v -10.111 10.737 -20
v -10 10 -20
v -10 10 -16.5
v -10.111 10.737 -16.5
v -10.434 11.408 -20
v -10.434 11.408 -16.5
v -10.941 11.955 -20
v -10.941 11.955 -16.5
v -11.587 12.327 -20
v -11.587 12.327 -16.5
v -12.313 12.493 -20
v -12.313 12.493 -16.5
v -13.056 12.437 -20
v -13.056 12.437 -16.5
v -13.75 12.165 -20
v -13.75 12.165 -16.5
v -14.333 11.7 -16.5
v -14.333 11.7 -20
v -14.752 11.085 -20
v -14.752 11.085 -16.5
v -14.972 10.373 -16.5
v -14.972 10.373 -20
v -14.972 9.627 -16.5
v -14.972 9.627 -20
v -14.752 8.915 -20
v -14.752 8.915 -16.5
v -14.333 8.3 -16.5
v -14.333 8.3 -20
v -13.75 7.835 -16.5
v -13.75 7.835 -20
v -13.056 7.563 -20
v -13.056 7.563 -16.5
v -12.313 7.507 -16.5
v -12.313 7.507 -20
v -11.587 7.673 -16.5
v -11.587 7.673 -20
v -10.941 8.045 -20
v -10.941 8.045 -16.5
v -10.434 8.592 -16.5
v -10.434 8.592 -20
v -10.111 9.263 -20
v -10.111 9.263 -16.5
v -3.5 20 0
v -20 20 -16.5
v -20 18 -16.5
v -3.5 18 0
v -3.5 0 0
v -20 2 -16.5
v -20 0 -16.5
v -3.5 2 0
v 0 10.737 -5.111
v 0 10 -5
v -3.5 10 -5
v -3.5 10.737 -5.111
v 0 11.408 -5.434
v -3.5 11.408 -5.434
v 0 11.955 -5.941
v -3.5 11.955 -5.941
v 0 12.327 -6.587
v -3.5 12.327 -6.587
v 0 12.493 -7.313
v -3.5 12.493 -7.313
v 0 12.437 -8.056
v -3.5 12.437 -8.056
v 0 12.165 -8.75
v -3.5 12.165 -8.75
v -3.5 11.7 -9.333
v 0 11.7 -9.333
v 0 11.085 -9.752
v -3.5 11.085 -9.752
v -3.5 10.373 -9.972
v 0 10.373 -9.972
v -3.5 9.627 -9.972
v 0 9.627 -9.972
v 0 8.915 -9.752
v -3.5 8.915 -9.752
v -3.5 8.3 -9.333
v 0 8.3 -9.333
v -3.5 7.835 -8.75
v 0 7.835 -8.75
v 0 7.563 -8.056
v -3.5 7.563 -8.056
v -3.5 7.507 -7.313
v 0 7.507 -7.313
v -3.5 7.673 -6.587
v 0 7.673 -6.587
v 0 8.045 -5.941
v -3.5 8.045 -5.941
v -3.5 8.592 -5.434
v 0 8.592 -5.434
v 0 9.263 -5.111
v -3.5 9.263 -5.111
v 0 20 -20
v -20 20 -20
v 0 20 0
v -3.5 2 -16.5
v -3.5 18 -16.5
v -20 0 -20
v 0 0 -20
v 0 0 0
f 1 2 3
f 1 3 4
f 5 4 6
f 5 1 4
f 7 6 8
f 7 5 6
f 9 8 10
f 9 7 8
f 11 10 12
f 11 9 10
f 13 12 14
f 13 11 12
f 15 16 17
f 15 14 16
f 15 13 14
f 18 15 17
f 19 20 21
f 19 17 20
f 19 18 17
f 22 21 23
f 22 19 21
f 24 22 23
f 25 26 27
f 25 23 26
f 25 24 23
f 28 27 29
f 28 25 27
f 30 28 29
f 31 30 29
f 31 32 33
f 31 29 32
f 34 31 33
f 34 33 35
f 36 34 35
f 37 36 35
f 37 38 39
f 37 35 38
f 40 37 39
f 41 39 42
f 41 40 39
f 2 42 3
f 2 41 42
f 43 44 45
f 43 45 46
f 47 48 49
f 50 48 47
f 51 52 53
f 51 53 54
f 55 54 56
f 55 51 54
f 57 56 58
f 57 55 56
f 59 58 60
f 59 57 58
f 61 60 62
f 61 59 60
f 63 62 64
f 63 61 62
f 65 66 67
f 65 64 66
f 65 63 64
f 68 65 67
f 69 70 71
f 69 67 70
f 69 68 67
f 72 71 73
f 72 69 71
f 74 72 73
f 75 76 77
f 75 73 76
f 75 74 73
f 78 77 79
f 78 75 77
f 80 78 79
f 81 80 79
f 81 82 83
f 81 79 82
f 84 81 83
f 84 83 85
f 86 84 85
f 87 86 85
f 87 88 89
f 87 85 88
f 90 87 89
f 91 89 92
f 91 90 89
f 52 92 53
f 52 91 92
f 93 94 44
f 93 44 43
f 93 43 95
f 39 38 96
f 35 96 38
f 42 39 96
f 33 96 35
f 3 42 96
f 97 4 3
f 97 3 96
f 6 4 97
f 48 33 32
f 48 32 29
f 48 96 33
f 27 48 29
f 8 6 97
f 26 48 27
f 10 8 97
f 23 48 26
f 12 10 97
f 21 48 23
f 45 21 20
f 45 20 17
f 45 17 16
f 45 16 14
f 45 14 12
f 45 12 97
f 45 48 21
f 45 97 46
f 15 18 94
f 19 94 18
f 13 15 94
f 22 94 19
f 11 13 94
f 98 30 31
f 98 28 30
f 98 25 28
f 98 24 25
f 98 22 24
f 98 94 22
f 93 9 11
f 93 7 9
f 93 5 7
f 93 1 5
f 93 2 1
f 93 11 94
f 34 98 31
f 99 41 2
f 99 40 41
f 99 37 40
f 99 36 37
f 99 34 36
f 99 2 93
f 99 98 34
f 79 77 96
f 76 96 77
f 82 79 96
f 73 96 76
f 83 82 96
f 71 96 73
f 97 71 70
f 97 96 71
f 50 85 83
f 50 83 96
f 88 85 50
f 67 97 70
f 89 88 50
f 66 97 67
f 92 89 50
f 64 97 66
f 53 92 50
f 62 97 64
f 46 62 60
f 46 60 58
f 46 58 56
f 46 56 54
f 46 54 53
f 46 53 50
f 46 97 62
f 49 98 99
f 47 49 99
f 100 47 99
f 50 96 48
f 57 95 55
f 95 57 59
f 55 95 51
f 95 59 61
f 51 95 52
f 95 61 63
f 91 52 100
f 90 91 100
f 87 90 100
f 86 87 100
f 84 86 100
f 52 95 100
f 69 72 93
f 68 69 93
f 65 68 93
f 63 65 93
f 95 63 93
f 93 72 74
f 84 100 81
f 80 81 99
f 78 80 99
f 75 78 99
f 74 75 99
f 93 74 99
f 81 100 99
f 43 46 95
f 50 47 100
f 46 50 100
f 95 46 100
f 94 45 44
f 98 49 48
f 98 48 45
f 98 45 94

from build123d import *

# Parameters (mm, degrees)
SKETCH1_W               = 20
SKETCH1_H               = 20
BOSS_EXTRUDE1_DEPTH     = 20
SKETCH2_W               = 16.5
SKETCH2_H               = 16
CUT_EXTRUDE1_DEPTH      = 16.5
CUT_EXTRUDE2_DEPTH      = 34.526109228
CUT_EXTRUDE2_DEPTH_BACK = 34.526109228
CUT_EXTRUDE3_DEPTH      = 33.74522866
CUT_EXTRUDE3_DEPTH_BACK = 33.74522866
SKETCH4_R               = 2.5
CUT_EXTRUDE4_DEPTH      = 33.74522866
CUT_EXTRUDE4_DEPTH_BACK = 33.74522866
SKETCH5_R               = 2.5


with BuildPart() as part:
    # Sketch1 → Boss-Extrude1 (new body)
    with BuildSketch(Plane(origin=(0, 0, 0), x_dir=(1, 0, 0), z_dir=(0, 1, 0))):
        with Locations((-10, 10)):
            Rectangle(SKETCH1_W, SKETCH1_H)
    extrude(amount=BOSS_EXTRUDE1_DEPTH)

    # Sketch2 → Cut-Extrude1 (cut)
    with BuildSketch(Plane.ZY.offset(20)):
        with Locations((-8.25, 10)):
            Rectangle(SKETCH2_W, SKETCH2_H)
    extrude(amount=-CUT_EXTRUDE1_DEPTH, mode=Mode.SUBTRACT)

    # Sketch3 → Cut-Extrude2 (cut, two sides: drawn at the far end of the back side and taken through both)
    with BuildSketch(Plane(origin=(0, 18, 0), x_dir=(-1, 0, 0), z_dir=(0, -1, 0)).offset(-CUT_EXTRUDE2_DEPTH_BACK)):
        Polygon((63.738492046, 60.238492046), (20, 16.5), (3.5, 0), (-40.238492046, -43.738492046), (47.238492046, -131.215476139), (151.215476139, -27.238492046), align=None)
    extrude(amount=CUT_EXTRUDE2_DEPTH + CUT_EXTRUDE2_DEPTH_BACK, mode=Mode.SUBTRACT)

    # Sketch4 → Cut-Extrude3 (cut, two sides: drawn at the far end of the back side and taken through both)
    with BuildSketch(Plane.ZY.offset(3.5).offset(-CUT_EXTRUDE3_DEPTH_BACK)):
        with Locations((-7.5, 10)):
            Circle(SKETCH4_R)
    extrude(amount=CUT_EXTRUDE3_DEPTH + CUT_EXTRUDE3_DEPTH_BACK, mode=Mode.SUBTRACT)

    # Sketch5 → Cut-Extrude4 (cut, two sides: drawn at the far end of the back side and taken through both)
    with BuildSketch(Plane.XY.offset(-16.5).offset(-CUT_EXTRUDE4_DEPTH_BACK)):
        with Locations((-12.5, 10)):
            Circle(SKETCH5_R)
    extrude(amount=CUT_EXTRUDE4_DEPTH + CUT_EXTRUDE4_DEPTH_BACK, mode=Mode.SUBTRACT)


solid = part.part
